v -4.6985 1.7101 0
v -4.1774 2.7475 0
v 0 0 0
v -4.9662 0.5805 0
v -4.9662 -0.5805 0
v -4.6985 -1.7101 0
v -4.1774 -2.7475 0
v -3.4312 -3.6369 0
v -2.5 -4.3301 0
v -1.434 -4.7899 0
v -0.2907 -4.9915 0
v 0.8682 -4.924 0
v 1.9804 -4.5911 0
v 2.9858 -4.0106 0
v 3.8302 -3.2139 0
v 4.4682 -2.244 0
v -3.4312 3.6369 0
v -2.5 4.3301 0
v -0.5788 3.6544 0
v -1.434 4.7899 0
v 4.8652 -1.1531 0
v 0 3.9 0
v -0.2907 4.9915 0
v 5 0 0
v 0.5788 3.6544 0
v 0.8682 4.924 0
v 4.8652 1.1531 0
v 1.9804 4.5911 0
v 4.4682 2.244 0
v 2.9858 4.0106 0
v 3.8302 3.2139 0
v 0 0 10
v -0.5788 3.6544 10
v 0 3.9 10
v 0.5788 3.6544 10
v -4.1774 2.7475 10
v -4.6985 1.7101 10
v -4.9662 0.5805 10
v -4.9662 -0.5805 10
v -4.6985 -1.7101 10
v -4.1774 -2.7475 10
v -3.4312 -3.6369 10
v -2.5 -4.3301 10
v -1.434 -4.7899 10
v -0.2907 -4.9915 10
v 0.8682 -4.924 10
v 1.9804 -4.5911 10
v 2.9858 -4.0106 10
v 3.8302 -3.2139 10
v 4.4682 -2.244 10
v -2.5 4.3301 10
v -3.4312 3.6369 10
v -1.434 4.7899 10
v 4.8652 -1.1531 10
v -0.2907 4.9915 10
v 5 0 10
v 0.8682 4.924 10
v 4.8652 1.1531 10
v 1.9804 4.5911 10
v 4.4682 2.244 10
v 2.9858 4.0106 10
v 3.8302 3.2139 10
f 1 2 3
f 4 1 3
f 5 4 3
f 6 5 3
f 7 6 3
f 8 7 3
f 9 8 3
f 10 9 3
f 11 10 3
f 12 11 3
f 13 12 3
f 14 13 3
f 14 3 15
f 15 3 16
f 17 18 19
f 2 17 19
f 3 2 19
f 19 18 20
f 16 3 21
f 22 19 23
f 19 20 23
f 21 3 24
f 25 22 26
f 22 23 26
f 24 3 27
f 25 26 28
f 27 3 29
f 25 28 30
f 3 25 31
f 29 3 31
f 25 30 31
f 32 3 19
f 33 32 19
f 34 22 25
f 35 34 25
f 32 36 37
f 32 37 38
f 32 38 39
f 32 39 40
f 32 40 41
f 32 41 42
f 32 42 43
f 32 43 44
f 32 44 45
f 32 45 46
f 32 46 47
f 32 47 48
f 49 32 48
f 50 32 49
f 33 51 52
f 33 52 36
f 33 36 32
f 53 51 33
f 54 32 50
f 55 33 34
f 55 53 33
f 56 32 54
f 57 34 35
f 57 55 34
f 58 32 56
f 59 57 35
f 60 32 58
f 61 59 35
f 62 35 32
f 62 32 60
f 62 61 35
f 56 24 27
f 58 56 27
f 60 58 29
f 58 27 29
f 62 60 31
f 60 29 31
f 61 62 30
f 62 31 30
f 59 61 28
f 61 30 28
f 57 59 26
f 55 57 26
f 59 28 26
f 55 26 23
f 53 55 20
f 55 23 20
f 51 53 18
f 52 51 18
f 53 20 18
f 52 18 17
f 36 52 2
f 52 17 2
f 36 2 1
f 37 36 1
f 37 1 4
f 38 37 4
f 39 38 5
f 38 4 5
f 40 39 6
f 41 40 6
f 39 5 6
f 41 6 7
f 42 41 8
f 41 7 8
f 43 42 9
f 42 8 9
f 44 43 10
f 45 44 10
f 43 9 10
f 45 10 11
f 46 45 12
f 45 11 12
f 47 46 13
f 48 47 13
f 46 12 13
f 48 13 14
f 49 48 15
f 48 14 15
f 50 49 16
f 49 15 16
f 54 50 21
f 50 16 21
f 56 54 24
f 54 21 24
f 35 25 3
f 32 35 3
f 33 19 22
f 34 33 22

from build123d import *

# Parameters (mm, degrees)
F0_R     = 5
F1_DEPTH = 10


with BuildPart() as f1:
    # F0 (on Top) → F1 (new body)
    with BuildSketch(Plane.XY):
        Circle(F0_R)
        Polygon((0.578808, 3.654447), (0, 0), (-0.578808, 3.654447), (0, 3.9), align=None, mode=Mode.SUBTRACT)
    extrude(amount=F1_DEPTH)


solid = f1.part
